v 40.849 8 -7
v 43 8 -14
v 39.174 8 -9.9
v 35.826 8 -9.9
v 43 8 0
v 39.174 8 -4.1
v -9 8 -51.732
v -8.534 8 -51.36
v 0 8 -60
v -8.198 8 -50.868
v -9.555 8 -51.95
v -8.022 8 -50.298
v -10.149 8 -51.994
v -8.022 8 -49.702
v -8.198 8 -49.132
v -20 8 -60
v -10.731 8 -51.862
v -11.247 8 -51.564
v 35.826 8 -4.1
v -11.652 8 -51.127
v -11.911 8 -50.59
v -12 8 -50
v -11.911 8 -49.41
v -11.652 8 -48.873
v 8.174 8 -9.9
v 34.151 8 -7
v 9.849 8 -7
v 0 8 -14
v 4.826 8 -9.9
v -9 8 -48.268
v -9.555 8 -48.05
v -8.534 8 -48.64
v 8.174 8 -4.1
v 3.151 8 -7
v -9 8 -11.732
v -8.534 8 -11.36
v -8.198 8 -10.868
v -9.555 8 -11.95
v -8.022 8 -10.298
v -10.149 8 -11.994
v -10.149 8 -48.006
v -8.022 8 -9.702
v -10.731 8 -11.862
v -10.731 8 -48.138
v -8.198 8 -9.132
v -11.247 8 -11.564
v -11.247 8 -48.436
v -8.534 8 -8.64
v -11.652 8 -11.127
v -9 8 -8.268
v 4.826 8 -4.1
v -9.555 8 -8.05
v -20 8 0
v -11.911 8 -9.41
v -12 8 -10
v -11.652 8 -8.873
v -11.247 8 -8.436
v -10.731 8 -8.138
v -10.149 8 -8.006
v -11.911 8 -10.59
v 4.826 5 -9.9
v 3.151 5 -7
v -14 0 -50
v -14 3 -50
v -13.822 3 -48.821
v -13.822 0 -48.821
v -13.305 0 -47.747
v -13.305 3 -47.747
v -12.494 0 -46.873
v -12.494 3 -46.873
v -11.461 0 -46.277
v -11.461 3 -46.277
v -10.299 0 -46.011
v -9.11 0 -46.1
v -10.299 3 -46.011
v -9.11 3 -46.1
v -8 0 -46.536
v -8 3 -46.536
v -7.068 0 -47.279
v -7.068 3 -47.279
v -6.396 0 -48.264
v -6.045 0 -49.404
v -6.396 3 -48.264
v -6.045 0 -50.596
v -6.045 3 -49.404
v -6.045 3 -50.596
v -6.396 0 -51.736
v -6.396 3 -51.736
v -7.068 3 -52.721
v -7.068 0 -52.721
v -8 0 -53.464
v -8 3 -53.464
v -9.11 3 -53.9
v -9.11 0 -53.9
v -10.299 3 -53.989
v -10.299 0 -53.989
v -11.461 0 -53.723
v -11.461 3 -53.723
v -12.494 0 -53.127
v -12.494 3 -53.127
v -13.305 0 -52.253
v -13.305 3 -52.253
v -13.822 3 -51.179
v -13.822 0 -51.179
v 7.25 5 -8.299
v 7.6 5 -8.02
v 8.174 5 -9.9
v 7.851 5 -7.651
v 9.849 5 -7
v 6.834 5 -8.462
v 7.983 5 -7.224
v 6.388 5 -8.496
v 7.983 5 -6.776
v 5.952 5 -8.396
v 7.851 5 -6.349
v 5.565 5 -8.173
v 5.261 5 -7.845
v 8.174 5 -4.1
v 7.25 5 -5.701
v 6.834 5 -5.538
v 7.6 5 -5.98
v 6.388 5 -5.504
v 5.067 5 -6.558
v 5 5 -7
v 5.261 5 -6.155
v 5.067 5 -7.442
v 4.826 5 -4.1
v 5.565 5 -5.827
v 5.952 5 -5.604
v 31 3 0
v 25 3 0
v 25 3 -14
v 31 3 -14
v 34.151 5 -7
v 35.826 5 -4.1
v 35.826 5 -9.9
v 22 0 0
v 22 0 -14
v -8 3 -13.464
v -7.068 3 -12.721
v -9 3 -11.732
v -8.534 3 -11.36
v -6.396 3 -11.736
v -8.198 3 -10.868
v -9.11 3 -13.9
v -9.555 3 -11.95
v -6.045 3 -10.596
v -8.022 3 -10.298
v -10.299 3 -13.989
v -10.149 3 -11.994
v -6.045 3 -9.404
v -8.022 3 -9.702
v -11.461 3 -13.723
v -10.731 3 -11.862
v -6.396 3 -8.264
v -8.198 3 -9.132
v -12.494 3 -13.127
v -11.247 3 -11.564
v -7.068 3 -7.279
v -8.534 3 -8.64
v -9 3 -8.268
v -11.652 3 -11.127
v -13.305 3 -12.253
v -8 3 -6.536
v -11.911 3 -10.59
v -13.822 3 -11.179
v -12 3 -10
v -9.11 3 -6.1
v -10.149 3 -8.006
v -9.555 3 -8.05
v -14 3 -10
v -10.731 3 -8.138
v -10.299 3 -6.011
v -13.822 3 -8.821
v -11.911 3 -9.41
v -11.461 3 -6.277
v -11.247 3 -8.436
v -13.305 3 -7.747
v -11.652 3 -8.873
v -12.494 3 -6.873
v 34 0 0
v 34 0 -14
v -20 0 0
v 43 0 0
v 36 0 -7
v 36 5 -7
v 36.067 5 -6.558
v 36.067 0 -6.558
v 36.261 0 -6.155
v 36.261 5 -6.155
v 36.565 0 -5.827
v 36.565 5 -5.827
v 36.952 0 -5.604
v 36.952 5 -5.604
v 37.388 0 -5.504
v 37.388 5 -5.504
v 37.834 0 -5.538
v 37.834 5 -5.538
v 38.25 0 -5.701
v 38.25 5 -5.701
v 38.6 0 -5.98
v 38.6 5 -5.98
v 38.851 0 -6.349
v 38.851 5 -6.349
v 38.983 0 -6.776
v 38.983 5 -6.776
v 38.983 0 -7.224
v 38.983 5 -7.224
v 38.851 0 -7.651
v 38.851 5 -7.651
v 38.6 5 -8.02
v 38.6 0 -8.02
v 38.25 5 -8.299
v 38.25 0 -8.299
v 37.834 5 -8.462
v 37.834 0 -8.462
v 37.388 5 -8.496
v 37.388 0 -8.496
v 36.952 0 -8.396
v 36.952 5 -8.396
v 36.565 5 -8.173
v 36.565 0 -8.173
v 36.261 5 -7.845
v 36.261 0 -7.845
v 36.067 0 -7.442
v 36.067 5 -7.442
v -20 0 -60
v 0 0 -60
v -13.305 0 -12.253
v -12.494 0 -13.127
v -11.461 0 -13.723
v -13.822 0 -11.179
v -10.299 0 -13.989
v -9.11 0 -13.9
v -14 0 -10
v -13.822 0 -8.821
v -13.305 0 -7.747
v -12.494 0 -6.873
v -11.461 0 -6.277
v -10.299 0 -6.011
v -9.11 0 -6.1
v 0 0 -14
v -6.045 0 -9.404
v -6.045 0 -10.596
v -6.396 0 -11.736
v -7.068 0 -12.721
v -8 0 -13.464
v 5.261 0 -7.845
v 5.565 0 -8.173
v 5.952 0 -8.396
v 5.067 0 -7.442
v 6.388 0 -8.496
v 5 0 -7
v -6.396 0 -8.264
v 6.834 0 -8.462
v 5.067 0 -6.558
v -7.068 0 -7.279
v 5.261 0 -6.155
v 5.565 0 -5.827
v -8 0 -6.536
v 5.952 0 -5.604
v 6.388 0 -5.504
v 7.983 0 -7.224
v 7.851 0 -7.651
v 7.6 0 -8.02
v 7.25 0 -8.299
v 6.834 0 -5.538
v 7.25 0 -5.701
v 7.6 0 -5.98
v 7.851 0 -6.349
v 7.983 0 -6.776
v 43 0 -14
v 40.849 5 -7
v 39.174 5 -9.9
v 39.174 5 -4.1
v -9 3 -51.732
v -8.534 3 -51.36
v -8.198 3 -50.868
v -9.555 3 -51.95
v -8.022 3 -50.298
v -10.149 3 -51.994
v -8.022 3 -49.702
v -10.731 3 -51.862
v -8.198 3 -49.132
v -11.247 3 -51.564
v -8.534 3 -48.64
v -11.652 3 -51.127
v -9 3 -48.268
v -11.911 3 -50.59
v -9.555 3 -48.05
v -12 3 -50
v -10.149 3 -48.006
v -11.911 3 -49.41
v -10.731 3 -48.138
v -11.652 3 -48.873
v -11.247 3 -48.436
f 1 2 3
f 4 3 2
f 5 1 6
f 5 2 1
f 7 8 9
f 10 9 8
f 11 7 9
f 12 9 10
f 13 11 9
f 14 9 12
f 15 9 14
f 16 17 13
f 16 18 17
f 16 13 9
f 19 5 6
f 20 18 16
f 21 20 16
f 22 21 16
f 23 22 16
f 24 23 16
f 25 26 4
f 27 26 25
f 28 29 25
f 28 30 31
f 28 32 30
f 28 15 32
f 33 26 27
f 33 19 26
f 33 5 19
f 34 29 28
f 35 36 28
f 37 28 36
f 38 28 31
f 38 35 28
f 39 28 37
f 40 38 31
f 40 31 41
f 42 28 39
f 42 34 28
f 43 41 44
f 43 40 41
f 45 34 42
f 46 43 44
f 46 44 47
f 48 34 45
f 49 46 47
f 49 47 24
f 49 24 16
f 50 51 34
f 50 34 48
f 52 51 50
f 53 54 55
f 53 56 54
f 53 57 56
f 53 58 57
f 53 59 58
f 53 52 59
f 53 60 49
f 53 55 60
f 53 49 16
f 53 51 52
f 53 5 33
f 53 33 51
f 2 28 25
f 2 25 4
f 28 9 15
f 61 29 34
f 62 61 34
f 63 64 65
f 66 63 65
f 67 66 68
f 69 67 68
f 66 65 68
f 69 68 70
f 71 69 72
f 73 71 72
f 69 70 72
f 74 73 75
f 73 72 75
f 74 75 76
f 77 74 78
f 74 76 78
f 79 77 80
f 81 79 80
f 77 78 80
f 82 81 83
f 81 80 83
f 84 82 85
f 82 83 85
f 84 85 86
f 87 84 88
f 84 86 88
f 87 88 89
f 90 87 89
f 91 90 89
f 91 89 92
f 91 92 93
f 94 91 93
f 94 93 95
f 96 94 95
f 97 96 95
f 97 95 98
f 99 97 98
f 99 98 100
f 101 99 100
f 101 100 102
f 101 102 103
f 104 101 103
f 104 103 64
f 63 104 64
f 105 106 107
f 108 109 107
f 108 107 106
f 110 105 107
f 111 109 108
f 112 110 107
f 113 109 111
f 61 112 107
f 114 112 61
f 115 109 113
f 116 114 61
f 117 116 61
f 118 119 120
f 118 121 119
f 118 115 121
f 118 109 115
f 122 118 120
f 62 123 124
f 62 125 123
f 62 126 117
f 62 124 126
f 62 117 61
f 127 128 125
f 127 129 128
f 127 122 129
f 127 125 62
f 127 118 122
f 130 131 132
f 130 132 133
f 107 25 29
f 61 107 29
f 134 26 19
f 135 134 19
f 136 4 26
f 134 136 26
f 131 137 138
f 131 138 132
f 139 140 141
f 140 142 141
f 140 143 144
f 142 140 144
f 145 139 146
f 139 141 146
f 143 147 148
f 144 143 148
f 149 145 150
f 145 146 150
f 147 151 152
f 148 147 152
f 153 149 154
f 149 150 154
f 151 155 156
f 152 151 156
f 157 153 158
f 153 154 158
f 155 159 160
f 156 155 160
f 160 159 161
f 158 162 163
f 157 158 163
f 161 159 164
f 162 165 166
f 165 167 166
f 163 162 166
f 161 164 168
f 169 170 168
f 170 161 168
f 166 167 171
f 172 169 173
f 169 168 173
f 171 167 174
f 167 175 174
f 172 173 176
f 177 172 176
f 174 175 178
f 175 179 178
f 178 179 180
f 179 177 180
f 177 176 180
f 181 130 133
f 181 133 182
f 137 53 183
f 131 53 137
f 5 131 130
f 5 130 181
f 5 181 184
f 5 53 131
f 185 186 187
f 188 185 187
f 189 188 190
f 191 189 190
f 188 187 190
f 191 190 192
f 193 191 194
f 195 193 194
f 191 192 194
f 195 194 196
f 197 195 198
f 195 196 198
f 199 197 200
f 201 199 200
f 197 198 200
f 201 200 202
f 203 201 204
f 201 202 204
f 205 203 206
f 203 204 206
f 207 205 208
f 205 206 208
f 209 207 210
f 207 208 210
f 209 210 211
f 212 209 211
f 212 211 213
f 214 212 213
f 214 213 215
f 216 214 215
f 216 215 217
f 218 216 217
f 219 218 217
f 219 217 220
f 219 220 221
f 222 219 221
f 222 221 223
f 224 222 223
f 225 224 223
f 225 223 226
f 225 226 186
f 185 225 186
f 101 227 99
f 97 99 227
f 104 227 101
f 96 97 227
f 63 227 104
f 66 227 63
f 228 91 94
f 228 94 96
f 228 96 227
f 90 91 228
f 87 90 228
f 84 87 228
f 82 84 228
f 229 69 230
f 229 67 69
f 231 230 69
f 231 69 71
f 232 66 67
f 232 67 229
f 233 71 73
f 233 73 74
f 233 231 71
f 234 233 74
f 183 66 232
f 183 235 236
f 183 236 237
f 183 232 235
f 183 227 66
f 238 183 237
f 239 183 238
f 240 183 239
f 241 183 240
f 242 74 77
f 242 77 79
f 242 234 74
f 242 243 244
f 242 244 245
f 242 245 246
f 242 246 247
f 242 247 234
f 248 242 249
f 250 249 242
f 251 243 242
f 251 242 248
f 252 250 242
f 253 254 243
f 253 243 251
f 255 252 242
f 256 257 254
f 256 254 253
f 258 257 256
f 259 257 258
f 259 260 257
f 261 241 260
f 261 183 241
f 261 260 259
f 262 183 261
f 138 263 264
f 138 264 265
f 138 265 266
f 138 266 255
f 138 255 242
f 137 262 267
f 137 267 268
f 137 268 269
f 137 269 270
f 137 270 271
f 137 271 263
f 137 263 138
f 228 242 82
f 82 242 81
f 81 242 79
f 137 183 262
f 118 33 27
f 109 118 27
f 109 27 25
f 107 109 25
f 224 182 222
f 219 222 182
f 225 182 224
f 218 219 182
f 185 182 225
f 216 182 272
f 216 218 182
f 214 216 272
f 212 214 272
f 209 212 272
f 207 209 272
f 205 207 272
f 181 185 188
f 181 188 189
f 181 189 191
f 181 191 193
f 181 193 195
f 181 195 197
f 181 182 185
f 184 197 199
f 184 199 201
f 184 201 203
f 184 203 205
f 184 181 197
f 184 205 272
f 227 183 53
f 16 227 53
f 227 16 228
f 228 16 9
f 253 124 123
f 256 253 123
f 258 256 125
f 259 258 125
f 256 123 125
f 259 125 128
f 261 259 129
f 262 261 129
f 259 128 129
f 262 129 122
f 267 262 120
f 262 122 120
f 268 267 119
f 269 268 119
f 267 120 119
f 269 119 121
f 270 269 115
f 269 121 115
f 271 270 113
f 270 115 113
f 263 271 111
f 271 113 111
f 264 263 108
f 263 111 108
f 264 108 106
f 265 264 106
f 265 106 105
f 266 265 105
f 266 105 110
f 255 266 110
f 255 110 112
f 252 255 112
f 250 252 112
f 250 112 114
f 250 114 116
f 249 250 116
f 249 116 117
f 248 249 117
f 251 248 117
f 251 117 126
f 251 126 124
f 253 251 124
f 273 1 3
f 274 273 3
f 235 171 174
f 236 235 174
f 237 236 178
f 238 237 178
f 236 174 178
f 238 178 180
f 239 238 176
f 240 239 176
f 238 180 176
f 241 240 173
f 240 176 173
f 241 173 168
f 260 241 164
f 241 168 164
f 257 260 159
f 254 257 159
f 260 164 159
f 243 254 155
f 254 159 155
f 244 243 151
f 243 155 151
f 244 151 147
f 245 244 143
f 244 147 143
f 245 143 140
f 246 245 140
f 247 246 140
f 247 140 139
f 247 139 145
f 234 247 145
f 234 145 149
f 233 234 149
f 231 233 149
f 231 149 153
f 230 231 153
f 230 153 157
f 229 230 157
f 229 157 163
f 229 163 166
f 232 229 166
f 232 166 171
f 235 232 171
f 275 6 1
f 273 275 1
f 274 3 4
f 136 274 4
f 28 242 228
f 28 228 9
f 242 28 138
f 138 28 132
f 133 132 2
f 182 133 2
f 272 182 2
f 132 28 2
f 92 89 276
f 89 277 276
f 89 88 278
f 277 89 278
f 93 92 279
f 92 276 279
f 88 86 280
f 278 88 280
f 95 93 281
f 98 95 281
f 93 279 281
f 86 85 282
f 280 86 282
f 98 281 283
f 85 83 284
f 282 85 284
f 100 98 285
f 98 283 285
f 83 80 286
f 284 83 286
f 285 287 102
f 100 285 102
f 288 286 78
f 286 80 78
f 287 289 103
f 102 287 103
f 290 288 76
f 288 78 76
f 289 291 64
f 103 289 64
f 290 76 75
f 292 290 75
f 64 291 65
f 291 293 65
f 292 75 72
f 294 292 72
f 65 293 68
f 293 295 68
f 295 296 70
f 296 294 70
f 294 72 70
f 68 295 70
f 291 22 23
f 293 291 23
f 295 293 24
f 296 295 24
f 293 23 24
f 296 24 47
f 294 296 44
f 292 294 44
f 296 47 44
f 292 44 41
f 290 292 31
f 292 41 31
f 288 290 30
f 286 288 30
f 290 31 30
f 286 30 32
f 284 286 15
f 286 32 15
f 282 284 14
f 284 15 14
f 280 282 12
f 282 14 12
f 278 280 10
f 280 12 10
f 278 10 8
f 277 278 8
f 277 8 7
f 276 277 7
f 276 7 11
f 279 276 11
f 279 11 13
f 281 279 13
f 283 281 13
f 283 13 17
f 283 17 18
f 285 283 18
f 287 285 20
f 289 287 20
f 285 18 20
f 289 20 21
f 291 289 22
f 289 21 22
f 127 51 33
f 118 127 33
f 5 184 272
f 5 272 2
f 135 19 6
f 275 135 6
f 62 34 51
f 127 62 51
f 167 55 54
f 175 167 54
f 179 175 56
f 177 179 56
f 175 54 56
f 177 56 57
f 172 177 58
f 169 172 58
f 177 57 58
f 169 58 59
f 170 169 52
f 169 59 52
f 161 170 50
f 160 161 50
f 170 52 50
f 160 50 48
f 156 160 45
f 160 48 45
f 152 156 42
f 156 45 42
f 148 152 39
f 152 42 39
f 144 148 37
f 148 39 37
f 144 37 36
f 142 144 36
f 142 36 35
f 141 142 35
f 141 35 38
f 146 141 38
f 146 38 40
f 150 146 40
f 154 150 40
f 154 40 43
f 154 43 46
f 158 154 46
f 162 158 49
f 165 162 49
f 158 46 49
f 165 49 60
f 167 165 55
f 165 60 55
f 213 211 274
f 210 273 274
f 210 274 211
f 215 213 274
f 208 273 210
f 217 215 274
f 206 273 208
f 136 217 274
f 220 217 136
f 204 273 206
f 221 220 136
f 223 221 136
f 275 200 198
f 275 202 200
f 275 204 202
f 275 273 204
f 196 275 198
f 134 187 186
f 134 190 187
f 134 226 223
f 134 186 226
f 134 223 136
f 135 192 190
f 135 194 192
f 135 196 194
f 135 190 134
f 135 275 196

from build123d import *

# Parameters (mm, degrees)
F1_DEPTH = 14
F0_W     = 20
F0_H     = 8
F2_DEPTH = 60
F3_R     = 4
F3_R_2   = 2
F3_R_3   = 1.5
F4_DEPTH = 8.001
F5_DEPTH = 3
F6_DEPTH = 5


# Not quite as in the source:
# - a feature names something its author has since deleted; it is built from what else it names


with BuildPart() as f1:
    # F0 (on Top) → F1 (new body)
    with BuildSketch(Plane.XY):
        Polygon((43, 0), (43, 8), (0, 8), (0, 0), (22, 0), (25, 3), (31, 3), (34, 0), align=None)
    extrude(amount=-F1_DEPTH)

    # F0 (on Top) → F2 (join)
    with BuildSketch(Plane.XY):
        with Locations((-10, 4)):
            Rectangle(F0_W, F0_H)
    extrude(amount=-F2_DEPTH)

    # F3 (on face) → F4 (cut, through all)
    with BuildSketch(Plane(origin=(0, 8, 0), x_dir=(-1, 0, 0), z_dir=(0, 1, 0))):
        with Locations((10, -10)):
            Circle(F3_R)
        with Locations((10, -10)):
            Circle(F3_R_2, mode=Mode.SUBTRACT)
        with Locations((10, -50)):
            Circle(F3_R)
        with Locations((10, -50)):
            Circle(F3_R_2, mode=Mode.SUBTRACT)
        with Locations((10, -10)):
            Circle(F3_R_2)
        with Locations((10, -50)):
            Circle(F3_R_2)
        with Locations((-37.5, -7)):
            Circle(F3_R_3)
        with Locations((-6.5, -7)):
            Circle(F3_R_3)
    extrude(amount=-F4_DEPTH, mode=Mode.SUBTRACT)

    # F3 (on face) → F5 (cut)
    with BuildSketch(Plane(origin=(0, 8, 0), x_dir=(-1, 0, 0), z_dir=(0, 1, 0))):
        Polygon((-8.1743157806, -9.9), (-4.8256842194, -9.9), (-3.1513684387, -7), (-4.8256842194, -4.1), (-8.1743157806, -4.1), (-9.8486315613, -7), align=None)
        with Locations((-6.5, -7)):
            Circle(F3_R_3, mode=Mode.SUBTRACT)
        Polygon((-39.1743157806, -9.9), (-35.8256842194, -9.9), (-34.1513684387, -7), (-35.8256842194, -4.1), (-39.1743157806, -4.1), (-40.8486315613, -7), align=None)
        with Locations((-37.5, -7)):
            Circle(F3_R_3, mode=Mode.SUBTRACT)
    extrude(amount=-F5_DEPTH, mode=Mode.SUBTRACT)

    # F3 (on face) → F6 (join)
    with BuildSketch(Plane(origin=(0, 8, 0), x_dir=(-1, 0, 0), z_dir=(0, 1, 0))):
        with Locations((10, -10)):
            Circle(F3_R)
        with Locations((10, -10)):
            Circle(F3_R_2, mode=Mode.SUBTRACT)
        with Locations((10, -50)):
            Circle(F3_R)
        with Locations((10, -50)):
            Circle(F3_R_2, mode=Mode.SUBTRACT)
    extrude(amount=-F6_DEPTH)


solid = f1.part
